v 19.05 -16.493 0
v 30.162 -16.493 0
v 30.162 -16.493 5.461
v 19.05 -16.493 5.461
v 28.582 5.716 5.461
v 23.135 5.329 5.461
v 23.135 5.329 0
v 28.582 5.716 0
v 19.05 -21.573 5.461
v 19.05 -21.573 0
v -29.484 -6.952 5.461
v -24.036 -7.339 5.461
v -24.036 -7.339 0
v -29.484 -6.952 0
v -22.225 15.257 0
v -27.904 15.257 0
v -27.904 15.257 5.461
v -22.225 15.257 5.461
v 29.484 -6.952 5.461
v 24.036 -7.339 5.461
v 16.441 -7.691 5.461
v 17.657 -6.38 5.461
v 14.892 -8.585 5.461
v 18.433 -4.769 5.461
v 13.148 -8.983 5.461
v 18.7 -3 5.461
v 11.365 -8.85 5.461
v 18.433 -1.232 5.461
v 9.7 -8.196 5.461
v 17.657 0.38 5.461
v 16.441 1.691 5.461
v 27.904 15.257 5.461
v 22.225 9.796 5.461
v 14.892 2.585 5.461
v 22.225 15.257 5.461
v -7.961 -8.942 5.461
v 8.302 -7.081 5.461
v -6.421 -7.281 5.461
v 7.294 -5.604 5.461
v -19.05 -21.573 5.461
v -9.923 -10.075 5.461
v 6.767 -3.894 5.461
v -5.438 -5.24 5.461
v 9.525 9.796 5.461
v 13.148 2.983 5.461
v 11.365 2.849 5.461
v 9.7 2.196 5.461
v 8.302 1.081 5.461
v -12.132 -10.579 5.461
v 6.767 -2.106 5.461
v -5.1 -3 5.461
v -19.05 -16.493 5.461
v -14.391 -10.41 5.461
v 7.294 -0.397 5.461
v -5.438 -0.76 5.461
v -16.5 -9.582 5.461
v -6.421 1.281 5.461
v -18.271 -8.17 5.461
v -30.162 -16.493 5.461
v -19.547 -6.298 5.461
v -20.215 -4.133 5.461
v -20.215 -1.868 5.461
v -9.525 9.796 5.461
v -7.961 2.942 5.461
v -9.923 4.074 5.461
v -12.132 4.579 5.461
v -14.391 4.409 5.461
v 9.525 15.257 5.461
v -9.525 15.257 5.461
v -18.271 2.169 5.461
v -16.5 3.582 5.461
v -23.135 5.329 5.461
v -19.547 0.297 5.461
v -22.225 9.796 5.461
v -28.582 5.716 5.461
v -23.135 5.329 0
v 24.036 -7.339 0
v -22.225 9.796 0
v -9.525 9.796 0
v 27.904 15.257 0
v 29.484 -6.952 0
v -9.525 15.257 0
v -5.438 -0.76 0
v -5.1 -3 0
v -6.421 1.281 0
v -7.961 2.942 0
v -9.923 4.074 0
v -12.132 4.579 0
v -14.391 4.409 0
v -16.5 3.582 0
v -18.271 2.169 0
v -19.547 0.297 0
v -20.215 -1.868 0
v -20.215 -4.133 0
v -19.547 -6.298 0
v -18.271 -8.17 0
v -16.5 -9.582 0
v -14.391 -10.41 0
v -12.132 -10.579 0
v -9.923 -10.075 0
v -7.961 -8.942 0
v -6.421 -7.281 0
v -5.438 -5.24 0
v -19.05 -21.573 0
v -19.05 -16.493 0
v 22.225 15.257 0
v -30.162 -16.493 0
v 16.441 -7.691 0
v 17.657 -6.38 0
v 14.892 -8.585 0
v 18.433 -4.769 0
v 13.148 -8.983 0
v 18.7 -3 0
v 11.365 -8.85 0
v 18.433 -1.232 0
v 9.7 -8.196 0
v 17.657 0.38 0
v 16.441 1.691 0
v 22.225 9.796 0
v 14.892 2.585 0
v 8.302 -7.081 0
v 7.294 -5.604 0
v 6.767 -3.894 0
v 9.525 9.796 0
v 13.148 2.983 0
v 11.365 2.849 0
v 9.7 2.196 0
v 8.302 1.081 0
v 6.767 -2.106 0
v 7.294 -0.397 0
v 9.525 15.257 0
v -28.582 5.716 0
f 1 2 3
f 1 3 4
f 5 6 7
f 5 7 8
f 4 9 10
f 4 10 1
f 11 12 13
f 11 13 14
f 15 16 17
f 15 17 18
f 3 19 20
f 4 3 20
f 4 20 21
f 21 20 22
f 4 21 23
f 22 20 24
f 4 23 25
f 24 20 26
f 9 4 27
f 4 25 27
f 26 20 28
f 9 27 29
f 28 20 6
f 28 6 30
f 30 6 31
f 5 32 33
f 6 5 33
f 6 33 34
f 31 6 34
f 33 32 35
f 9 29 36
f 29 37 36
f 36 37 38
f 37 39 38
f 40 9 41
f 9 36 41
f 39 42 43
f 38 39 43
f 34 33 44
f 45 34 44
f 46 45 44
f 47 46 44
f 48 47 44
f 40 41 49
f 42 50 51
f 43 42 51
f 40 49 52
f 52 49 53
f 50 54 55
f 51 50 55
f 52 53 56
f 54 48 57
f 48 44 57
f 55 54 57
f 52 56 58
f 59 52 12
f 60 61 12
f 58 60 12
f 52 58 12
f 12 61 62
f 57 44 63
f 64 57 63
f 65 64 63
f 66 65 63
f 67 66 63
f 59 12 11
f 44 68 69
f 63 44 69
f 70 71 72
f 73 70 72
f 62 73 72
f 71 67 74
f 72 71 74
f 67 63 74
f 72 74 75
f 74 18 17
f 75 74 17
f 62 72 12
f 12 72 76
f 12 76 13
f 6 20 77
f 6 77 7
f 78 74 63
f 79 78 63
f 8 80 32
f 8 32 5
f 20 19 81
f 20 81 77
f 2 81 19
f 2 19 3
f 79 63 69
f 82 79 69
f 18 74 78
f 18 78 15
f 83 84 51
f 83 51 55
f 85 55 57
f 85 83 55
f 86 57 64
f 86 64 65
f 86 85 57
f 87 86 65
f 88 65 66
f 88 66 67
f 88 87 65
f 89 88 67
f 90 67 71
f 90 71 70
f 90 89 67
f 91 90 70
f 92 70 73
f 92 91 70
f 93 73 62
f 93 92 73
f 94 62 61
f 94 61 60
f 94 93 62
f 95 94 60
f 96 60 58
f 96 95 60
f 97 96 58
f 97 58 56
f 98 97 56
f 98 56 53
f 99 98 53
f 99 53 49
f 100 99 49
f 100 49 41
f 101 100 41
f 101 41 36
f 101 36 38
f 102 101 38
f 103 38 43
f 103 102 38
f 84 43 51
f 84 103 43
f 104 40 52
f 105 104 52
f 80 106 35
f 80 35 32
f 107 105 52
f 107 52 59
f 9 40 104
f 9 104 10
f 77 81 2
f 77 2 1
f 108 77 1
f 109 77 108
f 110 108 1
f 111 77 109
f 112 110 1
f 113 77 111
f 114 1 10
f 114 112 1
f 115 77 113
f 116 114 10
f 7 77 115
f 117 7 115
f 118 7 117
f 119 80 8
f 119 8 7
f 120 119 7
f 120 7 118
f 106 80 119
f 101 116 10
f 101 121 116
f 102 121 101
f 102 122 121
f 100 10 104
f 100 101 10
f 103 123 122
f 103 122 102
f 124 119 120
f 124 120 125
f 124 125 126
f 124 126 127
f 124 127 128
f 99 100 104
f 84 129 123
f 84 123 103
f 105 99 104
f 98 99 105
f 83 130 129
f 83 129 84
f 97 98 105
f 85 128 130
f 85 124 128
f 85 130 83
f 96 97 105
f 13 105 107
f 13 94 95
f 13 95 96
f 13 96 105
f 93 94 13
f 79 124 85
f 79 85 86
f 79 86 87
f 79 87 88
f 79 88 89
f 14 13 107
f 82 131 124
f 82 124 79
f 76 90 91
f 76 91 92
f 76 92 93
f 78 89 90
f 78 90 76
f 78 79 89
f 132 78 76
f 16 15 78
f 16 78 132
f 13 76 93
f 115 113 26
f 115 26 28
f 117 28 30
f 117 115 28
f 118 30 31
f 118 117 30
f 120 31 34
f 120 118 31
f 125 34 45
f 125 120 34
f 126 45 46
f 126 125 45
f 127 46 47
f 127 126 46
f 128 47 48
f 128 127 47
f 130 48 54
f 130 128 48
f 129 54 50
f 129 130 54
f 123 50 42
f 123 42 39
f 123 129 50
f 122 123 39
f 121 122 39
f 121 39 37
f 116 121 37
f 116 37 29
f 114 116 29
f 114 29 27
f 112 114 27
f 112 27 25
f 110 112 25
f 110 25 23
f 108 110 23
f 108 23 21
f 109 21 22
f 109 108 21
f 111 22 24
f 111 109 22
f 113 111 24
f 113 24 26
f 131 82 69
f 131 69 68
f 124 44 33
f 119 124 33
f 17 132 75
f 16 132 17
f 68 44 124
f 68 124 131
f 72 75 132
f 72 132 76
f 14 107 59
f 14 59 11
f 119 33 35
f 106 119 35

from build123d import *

# Parameters (mm, degrees)
SKETCH1_R           = 6
SKETCH1_R_2         = 7.6
BOSS_EXTRUDE1_DEPTH = 5.461
SKETCH2_W           = 12.7
SKETCH2_H           = 5.461
CUT_EXTRUDE1_DEPTH  = 6.461
SKETCH3_W           = 38.1
SKETCH3_H           = 5.08
BOSS_EXTRUDE2_DEPTH = 5.461


with BuildPart() as part:
    # Sketch1 → Boss-Extrude1 (new body)
    with BuildSketch(Plane.XY):
        Polygon((-27.903685016, 15.257451458), (27.903685016, 15.257451458), (30.1625, -16.492548542), (-30.1625, -16.492548542), align=None)
        with Locations((12.7, -3.00023153)):
            Circle(SKETCH1_R, mode=Mode.SUBTRACT)
        with Locations((-12.7, -3.00023153)):
            Circle(SKETCH1_R_2, mode=Mode.SUBTRACT)
    extrude(amount=BOSS_EXTRUDE1_DEPTH)

    # Sketch2 → Cut-Extrude1 (cut, through all)
    with BuildSketch(Plane.XY.offset(5.461)):
        with Locations((-15.875, 12.526951458)):
            Rectangle(SKETCH2_W, SKETCH2_H)
        with Locations((15.875, 12.526951458)):
            Rectangle(SKETCH2_W, SKETCH2_H)
        Polygon((-29.483716542, -6.951539225), (-28.582468475, 5.716442142), (-23.135236487, 5.328905473), (-24.036484554, -7.339075894), align=None)
        Polygon((28.582468475, 5.716442142), (29.483716542, -6.951539225), (24.036484554, -7.339075894), (23.135236487, 5.328905473), align=None)
    extrude(amount=-CUT_EXTRUDE1_DEPTH, mode=Mode.SUBTRACT)

    # Sketch3 → Boss-Extrude2 (add)
    with BuildSketch(Plane.XY.offset(5.461)):
        with Locations((0, -19.032548542)):
            Rectangle(SKETCH3_W, SKETCH3_H)
    extrude(amount=-BOSS_EXTRUDE2_DEPTH)


solid = part.part
